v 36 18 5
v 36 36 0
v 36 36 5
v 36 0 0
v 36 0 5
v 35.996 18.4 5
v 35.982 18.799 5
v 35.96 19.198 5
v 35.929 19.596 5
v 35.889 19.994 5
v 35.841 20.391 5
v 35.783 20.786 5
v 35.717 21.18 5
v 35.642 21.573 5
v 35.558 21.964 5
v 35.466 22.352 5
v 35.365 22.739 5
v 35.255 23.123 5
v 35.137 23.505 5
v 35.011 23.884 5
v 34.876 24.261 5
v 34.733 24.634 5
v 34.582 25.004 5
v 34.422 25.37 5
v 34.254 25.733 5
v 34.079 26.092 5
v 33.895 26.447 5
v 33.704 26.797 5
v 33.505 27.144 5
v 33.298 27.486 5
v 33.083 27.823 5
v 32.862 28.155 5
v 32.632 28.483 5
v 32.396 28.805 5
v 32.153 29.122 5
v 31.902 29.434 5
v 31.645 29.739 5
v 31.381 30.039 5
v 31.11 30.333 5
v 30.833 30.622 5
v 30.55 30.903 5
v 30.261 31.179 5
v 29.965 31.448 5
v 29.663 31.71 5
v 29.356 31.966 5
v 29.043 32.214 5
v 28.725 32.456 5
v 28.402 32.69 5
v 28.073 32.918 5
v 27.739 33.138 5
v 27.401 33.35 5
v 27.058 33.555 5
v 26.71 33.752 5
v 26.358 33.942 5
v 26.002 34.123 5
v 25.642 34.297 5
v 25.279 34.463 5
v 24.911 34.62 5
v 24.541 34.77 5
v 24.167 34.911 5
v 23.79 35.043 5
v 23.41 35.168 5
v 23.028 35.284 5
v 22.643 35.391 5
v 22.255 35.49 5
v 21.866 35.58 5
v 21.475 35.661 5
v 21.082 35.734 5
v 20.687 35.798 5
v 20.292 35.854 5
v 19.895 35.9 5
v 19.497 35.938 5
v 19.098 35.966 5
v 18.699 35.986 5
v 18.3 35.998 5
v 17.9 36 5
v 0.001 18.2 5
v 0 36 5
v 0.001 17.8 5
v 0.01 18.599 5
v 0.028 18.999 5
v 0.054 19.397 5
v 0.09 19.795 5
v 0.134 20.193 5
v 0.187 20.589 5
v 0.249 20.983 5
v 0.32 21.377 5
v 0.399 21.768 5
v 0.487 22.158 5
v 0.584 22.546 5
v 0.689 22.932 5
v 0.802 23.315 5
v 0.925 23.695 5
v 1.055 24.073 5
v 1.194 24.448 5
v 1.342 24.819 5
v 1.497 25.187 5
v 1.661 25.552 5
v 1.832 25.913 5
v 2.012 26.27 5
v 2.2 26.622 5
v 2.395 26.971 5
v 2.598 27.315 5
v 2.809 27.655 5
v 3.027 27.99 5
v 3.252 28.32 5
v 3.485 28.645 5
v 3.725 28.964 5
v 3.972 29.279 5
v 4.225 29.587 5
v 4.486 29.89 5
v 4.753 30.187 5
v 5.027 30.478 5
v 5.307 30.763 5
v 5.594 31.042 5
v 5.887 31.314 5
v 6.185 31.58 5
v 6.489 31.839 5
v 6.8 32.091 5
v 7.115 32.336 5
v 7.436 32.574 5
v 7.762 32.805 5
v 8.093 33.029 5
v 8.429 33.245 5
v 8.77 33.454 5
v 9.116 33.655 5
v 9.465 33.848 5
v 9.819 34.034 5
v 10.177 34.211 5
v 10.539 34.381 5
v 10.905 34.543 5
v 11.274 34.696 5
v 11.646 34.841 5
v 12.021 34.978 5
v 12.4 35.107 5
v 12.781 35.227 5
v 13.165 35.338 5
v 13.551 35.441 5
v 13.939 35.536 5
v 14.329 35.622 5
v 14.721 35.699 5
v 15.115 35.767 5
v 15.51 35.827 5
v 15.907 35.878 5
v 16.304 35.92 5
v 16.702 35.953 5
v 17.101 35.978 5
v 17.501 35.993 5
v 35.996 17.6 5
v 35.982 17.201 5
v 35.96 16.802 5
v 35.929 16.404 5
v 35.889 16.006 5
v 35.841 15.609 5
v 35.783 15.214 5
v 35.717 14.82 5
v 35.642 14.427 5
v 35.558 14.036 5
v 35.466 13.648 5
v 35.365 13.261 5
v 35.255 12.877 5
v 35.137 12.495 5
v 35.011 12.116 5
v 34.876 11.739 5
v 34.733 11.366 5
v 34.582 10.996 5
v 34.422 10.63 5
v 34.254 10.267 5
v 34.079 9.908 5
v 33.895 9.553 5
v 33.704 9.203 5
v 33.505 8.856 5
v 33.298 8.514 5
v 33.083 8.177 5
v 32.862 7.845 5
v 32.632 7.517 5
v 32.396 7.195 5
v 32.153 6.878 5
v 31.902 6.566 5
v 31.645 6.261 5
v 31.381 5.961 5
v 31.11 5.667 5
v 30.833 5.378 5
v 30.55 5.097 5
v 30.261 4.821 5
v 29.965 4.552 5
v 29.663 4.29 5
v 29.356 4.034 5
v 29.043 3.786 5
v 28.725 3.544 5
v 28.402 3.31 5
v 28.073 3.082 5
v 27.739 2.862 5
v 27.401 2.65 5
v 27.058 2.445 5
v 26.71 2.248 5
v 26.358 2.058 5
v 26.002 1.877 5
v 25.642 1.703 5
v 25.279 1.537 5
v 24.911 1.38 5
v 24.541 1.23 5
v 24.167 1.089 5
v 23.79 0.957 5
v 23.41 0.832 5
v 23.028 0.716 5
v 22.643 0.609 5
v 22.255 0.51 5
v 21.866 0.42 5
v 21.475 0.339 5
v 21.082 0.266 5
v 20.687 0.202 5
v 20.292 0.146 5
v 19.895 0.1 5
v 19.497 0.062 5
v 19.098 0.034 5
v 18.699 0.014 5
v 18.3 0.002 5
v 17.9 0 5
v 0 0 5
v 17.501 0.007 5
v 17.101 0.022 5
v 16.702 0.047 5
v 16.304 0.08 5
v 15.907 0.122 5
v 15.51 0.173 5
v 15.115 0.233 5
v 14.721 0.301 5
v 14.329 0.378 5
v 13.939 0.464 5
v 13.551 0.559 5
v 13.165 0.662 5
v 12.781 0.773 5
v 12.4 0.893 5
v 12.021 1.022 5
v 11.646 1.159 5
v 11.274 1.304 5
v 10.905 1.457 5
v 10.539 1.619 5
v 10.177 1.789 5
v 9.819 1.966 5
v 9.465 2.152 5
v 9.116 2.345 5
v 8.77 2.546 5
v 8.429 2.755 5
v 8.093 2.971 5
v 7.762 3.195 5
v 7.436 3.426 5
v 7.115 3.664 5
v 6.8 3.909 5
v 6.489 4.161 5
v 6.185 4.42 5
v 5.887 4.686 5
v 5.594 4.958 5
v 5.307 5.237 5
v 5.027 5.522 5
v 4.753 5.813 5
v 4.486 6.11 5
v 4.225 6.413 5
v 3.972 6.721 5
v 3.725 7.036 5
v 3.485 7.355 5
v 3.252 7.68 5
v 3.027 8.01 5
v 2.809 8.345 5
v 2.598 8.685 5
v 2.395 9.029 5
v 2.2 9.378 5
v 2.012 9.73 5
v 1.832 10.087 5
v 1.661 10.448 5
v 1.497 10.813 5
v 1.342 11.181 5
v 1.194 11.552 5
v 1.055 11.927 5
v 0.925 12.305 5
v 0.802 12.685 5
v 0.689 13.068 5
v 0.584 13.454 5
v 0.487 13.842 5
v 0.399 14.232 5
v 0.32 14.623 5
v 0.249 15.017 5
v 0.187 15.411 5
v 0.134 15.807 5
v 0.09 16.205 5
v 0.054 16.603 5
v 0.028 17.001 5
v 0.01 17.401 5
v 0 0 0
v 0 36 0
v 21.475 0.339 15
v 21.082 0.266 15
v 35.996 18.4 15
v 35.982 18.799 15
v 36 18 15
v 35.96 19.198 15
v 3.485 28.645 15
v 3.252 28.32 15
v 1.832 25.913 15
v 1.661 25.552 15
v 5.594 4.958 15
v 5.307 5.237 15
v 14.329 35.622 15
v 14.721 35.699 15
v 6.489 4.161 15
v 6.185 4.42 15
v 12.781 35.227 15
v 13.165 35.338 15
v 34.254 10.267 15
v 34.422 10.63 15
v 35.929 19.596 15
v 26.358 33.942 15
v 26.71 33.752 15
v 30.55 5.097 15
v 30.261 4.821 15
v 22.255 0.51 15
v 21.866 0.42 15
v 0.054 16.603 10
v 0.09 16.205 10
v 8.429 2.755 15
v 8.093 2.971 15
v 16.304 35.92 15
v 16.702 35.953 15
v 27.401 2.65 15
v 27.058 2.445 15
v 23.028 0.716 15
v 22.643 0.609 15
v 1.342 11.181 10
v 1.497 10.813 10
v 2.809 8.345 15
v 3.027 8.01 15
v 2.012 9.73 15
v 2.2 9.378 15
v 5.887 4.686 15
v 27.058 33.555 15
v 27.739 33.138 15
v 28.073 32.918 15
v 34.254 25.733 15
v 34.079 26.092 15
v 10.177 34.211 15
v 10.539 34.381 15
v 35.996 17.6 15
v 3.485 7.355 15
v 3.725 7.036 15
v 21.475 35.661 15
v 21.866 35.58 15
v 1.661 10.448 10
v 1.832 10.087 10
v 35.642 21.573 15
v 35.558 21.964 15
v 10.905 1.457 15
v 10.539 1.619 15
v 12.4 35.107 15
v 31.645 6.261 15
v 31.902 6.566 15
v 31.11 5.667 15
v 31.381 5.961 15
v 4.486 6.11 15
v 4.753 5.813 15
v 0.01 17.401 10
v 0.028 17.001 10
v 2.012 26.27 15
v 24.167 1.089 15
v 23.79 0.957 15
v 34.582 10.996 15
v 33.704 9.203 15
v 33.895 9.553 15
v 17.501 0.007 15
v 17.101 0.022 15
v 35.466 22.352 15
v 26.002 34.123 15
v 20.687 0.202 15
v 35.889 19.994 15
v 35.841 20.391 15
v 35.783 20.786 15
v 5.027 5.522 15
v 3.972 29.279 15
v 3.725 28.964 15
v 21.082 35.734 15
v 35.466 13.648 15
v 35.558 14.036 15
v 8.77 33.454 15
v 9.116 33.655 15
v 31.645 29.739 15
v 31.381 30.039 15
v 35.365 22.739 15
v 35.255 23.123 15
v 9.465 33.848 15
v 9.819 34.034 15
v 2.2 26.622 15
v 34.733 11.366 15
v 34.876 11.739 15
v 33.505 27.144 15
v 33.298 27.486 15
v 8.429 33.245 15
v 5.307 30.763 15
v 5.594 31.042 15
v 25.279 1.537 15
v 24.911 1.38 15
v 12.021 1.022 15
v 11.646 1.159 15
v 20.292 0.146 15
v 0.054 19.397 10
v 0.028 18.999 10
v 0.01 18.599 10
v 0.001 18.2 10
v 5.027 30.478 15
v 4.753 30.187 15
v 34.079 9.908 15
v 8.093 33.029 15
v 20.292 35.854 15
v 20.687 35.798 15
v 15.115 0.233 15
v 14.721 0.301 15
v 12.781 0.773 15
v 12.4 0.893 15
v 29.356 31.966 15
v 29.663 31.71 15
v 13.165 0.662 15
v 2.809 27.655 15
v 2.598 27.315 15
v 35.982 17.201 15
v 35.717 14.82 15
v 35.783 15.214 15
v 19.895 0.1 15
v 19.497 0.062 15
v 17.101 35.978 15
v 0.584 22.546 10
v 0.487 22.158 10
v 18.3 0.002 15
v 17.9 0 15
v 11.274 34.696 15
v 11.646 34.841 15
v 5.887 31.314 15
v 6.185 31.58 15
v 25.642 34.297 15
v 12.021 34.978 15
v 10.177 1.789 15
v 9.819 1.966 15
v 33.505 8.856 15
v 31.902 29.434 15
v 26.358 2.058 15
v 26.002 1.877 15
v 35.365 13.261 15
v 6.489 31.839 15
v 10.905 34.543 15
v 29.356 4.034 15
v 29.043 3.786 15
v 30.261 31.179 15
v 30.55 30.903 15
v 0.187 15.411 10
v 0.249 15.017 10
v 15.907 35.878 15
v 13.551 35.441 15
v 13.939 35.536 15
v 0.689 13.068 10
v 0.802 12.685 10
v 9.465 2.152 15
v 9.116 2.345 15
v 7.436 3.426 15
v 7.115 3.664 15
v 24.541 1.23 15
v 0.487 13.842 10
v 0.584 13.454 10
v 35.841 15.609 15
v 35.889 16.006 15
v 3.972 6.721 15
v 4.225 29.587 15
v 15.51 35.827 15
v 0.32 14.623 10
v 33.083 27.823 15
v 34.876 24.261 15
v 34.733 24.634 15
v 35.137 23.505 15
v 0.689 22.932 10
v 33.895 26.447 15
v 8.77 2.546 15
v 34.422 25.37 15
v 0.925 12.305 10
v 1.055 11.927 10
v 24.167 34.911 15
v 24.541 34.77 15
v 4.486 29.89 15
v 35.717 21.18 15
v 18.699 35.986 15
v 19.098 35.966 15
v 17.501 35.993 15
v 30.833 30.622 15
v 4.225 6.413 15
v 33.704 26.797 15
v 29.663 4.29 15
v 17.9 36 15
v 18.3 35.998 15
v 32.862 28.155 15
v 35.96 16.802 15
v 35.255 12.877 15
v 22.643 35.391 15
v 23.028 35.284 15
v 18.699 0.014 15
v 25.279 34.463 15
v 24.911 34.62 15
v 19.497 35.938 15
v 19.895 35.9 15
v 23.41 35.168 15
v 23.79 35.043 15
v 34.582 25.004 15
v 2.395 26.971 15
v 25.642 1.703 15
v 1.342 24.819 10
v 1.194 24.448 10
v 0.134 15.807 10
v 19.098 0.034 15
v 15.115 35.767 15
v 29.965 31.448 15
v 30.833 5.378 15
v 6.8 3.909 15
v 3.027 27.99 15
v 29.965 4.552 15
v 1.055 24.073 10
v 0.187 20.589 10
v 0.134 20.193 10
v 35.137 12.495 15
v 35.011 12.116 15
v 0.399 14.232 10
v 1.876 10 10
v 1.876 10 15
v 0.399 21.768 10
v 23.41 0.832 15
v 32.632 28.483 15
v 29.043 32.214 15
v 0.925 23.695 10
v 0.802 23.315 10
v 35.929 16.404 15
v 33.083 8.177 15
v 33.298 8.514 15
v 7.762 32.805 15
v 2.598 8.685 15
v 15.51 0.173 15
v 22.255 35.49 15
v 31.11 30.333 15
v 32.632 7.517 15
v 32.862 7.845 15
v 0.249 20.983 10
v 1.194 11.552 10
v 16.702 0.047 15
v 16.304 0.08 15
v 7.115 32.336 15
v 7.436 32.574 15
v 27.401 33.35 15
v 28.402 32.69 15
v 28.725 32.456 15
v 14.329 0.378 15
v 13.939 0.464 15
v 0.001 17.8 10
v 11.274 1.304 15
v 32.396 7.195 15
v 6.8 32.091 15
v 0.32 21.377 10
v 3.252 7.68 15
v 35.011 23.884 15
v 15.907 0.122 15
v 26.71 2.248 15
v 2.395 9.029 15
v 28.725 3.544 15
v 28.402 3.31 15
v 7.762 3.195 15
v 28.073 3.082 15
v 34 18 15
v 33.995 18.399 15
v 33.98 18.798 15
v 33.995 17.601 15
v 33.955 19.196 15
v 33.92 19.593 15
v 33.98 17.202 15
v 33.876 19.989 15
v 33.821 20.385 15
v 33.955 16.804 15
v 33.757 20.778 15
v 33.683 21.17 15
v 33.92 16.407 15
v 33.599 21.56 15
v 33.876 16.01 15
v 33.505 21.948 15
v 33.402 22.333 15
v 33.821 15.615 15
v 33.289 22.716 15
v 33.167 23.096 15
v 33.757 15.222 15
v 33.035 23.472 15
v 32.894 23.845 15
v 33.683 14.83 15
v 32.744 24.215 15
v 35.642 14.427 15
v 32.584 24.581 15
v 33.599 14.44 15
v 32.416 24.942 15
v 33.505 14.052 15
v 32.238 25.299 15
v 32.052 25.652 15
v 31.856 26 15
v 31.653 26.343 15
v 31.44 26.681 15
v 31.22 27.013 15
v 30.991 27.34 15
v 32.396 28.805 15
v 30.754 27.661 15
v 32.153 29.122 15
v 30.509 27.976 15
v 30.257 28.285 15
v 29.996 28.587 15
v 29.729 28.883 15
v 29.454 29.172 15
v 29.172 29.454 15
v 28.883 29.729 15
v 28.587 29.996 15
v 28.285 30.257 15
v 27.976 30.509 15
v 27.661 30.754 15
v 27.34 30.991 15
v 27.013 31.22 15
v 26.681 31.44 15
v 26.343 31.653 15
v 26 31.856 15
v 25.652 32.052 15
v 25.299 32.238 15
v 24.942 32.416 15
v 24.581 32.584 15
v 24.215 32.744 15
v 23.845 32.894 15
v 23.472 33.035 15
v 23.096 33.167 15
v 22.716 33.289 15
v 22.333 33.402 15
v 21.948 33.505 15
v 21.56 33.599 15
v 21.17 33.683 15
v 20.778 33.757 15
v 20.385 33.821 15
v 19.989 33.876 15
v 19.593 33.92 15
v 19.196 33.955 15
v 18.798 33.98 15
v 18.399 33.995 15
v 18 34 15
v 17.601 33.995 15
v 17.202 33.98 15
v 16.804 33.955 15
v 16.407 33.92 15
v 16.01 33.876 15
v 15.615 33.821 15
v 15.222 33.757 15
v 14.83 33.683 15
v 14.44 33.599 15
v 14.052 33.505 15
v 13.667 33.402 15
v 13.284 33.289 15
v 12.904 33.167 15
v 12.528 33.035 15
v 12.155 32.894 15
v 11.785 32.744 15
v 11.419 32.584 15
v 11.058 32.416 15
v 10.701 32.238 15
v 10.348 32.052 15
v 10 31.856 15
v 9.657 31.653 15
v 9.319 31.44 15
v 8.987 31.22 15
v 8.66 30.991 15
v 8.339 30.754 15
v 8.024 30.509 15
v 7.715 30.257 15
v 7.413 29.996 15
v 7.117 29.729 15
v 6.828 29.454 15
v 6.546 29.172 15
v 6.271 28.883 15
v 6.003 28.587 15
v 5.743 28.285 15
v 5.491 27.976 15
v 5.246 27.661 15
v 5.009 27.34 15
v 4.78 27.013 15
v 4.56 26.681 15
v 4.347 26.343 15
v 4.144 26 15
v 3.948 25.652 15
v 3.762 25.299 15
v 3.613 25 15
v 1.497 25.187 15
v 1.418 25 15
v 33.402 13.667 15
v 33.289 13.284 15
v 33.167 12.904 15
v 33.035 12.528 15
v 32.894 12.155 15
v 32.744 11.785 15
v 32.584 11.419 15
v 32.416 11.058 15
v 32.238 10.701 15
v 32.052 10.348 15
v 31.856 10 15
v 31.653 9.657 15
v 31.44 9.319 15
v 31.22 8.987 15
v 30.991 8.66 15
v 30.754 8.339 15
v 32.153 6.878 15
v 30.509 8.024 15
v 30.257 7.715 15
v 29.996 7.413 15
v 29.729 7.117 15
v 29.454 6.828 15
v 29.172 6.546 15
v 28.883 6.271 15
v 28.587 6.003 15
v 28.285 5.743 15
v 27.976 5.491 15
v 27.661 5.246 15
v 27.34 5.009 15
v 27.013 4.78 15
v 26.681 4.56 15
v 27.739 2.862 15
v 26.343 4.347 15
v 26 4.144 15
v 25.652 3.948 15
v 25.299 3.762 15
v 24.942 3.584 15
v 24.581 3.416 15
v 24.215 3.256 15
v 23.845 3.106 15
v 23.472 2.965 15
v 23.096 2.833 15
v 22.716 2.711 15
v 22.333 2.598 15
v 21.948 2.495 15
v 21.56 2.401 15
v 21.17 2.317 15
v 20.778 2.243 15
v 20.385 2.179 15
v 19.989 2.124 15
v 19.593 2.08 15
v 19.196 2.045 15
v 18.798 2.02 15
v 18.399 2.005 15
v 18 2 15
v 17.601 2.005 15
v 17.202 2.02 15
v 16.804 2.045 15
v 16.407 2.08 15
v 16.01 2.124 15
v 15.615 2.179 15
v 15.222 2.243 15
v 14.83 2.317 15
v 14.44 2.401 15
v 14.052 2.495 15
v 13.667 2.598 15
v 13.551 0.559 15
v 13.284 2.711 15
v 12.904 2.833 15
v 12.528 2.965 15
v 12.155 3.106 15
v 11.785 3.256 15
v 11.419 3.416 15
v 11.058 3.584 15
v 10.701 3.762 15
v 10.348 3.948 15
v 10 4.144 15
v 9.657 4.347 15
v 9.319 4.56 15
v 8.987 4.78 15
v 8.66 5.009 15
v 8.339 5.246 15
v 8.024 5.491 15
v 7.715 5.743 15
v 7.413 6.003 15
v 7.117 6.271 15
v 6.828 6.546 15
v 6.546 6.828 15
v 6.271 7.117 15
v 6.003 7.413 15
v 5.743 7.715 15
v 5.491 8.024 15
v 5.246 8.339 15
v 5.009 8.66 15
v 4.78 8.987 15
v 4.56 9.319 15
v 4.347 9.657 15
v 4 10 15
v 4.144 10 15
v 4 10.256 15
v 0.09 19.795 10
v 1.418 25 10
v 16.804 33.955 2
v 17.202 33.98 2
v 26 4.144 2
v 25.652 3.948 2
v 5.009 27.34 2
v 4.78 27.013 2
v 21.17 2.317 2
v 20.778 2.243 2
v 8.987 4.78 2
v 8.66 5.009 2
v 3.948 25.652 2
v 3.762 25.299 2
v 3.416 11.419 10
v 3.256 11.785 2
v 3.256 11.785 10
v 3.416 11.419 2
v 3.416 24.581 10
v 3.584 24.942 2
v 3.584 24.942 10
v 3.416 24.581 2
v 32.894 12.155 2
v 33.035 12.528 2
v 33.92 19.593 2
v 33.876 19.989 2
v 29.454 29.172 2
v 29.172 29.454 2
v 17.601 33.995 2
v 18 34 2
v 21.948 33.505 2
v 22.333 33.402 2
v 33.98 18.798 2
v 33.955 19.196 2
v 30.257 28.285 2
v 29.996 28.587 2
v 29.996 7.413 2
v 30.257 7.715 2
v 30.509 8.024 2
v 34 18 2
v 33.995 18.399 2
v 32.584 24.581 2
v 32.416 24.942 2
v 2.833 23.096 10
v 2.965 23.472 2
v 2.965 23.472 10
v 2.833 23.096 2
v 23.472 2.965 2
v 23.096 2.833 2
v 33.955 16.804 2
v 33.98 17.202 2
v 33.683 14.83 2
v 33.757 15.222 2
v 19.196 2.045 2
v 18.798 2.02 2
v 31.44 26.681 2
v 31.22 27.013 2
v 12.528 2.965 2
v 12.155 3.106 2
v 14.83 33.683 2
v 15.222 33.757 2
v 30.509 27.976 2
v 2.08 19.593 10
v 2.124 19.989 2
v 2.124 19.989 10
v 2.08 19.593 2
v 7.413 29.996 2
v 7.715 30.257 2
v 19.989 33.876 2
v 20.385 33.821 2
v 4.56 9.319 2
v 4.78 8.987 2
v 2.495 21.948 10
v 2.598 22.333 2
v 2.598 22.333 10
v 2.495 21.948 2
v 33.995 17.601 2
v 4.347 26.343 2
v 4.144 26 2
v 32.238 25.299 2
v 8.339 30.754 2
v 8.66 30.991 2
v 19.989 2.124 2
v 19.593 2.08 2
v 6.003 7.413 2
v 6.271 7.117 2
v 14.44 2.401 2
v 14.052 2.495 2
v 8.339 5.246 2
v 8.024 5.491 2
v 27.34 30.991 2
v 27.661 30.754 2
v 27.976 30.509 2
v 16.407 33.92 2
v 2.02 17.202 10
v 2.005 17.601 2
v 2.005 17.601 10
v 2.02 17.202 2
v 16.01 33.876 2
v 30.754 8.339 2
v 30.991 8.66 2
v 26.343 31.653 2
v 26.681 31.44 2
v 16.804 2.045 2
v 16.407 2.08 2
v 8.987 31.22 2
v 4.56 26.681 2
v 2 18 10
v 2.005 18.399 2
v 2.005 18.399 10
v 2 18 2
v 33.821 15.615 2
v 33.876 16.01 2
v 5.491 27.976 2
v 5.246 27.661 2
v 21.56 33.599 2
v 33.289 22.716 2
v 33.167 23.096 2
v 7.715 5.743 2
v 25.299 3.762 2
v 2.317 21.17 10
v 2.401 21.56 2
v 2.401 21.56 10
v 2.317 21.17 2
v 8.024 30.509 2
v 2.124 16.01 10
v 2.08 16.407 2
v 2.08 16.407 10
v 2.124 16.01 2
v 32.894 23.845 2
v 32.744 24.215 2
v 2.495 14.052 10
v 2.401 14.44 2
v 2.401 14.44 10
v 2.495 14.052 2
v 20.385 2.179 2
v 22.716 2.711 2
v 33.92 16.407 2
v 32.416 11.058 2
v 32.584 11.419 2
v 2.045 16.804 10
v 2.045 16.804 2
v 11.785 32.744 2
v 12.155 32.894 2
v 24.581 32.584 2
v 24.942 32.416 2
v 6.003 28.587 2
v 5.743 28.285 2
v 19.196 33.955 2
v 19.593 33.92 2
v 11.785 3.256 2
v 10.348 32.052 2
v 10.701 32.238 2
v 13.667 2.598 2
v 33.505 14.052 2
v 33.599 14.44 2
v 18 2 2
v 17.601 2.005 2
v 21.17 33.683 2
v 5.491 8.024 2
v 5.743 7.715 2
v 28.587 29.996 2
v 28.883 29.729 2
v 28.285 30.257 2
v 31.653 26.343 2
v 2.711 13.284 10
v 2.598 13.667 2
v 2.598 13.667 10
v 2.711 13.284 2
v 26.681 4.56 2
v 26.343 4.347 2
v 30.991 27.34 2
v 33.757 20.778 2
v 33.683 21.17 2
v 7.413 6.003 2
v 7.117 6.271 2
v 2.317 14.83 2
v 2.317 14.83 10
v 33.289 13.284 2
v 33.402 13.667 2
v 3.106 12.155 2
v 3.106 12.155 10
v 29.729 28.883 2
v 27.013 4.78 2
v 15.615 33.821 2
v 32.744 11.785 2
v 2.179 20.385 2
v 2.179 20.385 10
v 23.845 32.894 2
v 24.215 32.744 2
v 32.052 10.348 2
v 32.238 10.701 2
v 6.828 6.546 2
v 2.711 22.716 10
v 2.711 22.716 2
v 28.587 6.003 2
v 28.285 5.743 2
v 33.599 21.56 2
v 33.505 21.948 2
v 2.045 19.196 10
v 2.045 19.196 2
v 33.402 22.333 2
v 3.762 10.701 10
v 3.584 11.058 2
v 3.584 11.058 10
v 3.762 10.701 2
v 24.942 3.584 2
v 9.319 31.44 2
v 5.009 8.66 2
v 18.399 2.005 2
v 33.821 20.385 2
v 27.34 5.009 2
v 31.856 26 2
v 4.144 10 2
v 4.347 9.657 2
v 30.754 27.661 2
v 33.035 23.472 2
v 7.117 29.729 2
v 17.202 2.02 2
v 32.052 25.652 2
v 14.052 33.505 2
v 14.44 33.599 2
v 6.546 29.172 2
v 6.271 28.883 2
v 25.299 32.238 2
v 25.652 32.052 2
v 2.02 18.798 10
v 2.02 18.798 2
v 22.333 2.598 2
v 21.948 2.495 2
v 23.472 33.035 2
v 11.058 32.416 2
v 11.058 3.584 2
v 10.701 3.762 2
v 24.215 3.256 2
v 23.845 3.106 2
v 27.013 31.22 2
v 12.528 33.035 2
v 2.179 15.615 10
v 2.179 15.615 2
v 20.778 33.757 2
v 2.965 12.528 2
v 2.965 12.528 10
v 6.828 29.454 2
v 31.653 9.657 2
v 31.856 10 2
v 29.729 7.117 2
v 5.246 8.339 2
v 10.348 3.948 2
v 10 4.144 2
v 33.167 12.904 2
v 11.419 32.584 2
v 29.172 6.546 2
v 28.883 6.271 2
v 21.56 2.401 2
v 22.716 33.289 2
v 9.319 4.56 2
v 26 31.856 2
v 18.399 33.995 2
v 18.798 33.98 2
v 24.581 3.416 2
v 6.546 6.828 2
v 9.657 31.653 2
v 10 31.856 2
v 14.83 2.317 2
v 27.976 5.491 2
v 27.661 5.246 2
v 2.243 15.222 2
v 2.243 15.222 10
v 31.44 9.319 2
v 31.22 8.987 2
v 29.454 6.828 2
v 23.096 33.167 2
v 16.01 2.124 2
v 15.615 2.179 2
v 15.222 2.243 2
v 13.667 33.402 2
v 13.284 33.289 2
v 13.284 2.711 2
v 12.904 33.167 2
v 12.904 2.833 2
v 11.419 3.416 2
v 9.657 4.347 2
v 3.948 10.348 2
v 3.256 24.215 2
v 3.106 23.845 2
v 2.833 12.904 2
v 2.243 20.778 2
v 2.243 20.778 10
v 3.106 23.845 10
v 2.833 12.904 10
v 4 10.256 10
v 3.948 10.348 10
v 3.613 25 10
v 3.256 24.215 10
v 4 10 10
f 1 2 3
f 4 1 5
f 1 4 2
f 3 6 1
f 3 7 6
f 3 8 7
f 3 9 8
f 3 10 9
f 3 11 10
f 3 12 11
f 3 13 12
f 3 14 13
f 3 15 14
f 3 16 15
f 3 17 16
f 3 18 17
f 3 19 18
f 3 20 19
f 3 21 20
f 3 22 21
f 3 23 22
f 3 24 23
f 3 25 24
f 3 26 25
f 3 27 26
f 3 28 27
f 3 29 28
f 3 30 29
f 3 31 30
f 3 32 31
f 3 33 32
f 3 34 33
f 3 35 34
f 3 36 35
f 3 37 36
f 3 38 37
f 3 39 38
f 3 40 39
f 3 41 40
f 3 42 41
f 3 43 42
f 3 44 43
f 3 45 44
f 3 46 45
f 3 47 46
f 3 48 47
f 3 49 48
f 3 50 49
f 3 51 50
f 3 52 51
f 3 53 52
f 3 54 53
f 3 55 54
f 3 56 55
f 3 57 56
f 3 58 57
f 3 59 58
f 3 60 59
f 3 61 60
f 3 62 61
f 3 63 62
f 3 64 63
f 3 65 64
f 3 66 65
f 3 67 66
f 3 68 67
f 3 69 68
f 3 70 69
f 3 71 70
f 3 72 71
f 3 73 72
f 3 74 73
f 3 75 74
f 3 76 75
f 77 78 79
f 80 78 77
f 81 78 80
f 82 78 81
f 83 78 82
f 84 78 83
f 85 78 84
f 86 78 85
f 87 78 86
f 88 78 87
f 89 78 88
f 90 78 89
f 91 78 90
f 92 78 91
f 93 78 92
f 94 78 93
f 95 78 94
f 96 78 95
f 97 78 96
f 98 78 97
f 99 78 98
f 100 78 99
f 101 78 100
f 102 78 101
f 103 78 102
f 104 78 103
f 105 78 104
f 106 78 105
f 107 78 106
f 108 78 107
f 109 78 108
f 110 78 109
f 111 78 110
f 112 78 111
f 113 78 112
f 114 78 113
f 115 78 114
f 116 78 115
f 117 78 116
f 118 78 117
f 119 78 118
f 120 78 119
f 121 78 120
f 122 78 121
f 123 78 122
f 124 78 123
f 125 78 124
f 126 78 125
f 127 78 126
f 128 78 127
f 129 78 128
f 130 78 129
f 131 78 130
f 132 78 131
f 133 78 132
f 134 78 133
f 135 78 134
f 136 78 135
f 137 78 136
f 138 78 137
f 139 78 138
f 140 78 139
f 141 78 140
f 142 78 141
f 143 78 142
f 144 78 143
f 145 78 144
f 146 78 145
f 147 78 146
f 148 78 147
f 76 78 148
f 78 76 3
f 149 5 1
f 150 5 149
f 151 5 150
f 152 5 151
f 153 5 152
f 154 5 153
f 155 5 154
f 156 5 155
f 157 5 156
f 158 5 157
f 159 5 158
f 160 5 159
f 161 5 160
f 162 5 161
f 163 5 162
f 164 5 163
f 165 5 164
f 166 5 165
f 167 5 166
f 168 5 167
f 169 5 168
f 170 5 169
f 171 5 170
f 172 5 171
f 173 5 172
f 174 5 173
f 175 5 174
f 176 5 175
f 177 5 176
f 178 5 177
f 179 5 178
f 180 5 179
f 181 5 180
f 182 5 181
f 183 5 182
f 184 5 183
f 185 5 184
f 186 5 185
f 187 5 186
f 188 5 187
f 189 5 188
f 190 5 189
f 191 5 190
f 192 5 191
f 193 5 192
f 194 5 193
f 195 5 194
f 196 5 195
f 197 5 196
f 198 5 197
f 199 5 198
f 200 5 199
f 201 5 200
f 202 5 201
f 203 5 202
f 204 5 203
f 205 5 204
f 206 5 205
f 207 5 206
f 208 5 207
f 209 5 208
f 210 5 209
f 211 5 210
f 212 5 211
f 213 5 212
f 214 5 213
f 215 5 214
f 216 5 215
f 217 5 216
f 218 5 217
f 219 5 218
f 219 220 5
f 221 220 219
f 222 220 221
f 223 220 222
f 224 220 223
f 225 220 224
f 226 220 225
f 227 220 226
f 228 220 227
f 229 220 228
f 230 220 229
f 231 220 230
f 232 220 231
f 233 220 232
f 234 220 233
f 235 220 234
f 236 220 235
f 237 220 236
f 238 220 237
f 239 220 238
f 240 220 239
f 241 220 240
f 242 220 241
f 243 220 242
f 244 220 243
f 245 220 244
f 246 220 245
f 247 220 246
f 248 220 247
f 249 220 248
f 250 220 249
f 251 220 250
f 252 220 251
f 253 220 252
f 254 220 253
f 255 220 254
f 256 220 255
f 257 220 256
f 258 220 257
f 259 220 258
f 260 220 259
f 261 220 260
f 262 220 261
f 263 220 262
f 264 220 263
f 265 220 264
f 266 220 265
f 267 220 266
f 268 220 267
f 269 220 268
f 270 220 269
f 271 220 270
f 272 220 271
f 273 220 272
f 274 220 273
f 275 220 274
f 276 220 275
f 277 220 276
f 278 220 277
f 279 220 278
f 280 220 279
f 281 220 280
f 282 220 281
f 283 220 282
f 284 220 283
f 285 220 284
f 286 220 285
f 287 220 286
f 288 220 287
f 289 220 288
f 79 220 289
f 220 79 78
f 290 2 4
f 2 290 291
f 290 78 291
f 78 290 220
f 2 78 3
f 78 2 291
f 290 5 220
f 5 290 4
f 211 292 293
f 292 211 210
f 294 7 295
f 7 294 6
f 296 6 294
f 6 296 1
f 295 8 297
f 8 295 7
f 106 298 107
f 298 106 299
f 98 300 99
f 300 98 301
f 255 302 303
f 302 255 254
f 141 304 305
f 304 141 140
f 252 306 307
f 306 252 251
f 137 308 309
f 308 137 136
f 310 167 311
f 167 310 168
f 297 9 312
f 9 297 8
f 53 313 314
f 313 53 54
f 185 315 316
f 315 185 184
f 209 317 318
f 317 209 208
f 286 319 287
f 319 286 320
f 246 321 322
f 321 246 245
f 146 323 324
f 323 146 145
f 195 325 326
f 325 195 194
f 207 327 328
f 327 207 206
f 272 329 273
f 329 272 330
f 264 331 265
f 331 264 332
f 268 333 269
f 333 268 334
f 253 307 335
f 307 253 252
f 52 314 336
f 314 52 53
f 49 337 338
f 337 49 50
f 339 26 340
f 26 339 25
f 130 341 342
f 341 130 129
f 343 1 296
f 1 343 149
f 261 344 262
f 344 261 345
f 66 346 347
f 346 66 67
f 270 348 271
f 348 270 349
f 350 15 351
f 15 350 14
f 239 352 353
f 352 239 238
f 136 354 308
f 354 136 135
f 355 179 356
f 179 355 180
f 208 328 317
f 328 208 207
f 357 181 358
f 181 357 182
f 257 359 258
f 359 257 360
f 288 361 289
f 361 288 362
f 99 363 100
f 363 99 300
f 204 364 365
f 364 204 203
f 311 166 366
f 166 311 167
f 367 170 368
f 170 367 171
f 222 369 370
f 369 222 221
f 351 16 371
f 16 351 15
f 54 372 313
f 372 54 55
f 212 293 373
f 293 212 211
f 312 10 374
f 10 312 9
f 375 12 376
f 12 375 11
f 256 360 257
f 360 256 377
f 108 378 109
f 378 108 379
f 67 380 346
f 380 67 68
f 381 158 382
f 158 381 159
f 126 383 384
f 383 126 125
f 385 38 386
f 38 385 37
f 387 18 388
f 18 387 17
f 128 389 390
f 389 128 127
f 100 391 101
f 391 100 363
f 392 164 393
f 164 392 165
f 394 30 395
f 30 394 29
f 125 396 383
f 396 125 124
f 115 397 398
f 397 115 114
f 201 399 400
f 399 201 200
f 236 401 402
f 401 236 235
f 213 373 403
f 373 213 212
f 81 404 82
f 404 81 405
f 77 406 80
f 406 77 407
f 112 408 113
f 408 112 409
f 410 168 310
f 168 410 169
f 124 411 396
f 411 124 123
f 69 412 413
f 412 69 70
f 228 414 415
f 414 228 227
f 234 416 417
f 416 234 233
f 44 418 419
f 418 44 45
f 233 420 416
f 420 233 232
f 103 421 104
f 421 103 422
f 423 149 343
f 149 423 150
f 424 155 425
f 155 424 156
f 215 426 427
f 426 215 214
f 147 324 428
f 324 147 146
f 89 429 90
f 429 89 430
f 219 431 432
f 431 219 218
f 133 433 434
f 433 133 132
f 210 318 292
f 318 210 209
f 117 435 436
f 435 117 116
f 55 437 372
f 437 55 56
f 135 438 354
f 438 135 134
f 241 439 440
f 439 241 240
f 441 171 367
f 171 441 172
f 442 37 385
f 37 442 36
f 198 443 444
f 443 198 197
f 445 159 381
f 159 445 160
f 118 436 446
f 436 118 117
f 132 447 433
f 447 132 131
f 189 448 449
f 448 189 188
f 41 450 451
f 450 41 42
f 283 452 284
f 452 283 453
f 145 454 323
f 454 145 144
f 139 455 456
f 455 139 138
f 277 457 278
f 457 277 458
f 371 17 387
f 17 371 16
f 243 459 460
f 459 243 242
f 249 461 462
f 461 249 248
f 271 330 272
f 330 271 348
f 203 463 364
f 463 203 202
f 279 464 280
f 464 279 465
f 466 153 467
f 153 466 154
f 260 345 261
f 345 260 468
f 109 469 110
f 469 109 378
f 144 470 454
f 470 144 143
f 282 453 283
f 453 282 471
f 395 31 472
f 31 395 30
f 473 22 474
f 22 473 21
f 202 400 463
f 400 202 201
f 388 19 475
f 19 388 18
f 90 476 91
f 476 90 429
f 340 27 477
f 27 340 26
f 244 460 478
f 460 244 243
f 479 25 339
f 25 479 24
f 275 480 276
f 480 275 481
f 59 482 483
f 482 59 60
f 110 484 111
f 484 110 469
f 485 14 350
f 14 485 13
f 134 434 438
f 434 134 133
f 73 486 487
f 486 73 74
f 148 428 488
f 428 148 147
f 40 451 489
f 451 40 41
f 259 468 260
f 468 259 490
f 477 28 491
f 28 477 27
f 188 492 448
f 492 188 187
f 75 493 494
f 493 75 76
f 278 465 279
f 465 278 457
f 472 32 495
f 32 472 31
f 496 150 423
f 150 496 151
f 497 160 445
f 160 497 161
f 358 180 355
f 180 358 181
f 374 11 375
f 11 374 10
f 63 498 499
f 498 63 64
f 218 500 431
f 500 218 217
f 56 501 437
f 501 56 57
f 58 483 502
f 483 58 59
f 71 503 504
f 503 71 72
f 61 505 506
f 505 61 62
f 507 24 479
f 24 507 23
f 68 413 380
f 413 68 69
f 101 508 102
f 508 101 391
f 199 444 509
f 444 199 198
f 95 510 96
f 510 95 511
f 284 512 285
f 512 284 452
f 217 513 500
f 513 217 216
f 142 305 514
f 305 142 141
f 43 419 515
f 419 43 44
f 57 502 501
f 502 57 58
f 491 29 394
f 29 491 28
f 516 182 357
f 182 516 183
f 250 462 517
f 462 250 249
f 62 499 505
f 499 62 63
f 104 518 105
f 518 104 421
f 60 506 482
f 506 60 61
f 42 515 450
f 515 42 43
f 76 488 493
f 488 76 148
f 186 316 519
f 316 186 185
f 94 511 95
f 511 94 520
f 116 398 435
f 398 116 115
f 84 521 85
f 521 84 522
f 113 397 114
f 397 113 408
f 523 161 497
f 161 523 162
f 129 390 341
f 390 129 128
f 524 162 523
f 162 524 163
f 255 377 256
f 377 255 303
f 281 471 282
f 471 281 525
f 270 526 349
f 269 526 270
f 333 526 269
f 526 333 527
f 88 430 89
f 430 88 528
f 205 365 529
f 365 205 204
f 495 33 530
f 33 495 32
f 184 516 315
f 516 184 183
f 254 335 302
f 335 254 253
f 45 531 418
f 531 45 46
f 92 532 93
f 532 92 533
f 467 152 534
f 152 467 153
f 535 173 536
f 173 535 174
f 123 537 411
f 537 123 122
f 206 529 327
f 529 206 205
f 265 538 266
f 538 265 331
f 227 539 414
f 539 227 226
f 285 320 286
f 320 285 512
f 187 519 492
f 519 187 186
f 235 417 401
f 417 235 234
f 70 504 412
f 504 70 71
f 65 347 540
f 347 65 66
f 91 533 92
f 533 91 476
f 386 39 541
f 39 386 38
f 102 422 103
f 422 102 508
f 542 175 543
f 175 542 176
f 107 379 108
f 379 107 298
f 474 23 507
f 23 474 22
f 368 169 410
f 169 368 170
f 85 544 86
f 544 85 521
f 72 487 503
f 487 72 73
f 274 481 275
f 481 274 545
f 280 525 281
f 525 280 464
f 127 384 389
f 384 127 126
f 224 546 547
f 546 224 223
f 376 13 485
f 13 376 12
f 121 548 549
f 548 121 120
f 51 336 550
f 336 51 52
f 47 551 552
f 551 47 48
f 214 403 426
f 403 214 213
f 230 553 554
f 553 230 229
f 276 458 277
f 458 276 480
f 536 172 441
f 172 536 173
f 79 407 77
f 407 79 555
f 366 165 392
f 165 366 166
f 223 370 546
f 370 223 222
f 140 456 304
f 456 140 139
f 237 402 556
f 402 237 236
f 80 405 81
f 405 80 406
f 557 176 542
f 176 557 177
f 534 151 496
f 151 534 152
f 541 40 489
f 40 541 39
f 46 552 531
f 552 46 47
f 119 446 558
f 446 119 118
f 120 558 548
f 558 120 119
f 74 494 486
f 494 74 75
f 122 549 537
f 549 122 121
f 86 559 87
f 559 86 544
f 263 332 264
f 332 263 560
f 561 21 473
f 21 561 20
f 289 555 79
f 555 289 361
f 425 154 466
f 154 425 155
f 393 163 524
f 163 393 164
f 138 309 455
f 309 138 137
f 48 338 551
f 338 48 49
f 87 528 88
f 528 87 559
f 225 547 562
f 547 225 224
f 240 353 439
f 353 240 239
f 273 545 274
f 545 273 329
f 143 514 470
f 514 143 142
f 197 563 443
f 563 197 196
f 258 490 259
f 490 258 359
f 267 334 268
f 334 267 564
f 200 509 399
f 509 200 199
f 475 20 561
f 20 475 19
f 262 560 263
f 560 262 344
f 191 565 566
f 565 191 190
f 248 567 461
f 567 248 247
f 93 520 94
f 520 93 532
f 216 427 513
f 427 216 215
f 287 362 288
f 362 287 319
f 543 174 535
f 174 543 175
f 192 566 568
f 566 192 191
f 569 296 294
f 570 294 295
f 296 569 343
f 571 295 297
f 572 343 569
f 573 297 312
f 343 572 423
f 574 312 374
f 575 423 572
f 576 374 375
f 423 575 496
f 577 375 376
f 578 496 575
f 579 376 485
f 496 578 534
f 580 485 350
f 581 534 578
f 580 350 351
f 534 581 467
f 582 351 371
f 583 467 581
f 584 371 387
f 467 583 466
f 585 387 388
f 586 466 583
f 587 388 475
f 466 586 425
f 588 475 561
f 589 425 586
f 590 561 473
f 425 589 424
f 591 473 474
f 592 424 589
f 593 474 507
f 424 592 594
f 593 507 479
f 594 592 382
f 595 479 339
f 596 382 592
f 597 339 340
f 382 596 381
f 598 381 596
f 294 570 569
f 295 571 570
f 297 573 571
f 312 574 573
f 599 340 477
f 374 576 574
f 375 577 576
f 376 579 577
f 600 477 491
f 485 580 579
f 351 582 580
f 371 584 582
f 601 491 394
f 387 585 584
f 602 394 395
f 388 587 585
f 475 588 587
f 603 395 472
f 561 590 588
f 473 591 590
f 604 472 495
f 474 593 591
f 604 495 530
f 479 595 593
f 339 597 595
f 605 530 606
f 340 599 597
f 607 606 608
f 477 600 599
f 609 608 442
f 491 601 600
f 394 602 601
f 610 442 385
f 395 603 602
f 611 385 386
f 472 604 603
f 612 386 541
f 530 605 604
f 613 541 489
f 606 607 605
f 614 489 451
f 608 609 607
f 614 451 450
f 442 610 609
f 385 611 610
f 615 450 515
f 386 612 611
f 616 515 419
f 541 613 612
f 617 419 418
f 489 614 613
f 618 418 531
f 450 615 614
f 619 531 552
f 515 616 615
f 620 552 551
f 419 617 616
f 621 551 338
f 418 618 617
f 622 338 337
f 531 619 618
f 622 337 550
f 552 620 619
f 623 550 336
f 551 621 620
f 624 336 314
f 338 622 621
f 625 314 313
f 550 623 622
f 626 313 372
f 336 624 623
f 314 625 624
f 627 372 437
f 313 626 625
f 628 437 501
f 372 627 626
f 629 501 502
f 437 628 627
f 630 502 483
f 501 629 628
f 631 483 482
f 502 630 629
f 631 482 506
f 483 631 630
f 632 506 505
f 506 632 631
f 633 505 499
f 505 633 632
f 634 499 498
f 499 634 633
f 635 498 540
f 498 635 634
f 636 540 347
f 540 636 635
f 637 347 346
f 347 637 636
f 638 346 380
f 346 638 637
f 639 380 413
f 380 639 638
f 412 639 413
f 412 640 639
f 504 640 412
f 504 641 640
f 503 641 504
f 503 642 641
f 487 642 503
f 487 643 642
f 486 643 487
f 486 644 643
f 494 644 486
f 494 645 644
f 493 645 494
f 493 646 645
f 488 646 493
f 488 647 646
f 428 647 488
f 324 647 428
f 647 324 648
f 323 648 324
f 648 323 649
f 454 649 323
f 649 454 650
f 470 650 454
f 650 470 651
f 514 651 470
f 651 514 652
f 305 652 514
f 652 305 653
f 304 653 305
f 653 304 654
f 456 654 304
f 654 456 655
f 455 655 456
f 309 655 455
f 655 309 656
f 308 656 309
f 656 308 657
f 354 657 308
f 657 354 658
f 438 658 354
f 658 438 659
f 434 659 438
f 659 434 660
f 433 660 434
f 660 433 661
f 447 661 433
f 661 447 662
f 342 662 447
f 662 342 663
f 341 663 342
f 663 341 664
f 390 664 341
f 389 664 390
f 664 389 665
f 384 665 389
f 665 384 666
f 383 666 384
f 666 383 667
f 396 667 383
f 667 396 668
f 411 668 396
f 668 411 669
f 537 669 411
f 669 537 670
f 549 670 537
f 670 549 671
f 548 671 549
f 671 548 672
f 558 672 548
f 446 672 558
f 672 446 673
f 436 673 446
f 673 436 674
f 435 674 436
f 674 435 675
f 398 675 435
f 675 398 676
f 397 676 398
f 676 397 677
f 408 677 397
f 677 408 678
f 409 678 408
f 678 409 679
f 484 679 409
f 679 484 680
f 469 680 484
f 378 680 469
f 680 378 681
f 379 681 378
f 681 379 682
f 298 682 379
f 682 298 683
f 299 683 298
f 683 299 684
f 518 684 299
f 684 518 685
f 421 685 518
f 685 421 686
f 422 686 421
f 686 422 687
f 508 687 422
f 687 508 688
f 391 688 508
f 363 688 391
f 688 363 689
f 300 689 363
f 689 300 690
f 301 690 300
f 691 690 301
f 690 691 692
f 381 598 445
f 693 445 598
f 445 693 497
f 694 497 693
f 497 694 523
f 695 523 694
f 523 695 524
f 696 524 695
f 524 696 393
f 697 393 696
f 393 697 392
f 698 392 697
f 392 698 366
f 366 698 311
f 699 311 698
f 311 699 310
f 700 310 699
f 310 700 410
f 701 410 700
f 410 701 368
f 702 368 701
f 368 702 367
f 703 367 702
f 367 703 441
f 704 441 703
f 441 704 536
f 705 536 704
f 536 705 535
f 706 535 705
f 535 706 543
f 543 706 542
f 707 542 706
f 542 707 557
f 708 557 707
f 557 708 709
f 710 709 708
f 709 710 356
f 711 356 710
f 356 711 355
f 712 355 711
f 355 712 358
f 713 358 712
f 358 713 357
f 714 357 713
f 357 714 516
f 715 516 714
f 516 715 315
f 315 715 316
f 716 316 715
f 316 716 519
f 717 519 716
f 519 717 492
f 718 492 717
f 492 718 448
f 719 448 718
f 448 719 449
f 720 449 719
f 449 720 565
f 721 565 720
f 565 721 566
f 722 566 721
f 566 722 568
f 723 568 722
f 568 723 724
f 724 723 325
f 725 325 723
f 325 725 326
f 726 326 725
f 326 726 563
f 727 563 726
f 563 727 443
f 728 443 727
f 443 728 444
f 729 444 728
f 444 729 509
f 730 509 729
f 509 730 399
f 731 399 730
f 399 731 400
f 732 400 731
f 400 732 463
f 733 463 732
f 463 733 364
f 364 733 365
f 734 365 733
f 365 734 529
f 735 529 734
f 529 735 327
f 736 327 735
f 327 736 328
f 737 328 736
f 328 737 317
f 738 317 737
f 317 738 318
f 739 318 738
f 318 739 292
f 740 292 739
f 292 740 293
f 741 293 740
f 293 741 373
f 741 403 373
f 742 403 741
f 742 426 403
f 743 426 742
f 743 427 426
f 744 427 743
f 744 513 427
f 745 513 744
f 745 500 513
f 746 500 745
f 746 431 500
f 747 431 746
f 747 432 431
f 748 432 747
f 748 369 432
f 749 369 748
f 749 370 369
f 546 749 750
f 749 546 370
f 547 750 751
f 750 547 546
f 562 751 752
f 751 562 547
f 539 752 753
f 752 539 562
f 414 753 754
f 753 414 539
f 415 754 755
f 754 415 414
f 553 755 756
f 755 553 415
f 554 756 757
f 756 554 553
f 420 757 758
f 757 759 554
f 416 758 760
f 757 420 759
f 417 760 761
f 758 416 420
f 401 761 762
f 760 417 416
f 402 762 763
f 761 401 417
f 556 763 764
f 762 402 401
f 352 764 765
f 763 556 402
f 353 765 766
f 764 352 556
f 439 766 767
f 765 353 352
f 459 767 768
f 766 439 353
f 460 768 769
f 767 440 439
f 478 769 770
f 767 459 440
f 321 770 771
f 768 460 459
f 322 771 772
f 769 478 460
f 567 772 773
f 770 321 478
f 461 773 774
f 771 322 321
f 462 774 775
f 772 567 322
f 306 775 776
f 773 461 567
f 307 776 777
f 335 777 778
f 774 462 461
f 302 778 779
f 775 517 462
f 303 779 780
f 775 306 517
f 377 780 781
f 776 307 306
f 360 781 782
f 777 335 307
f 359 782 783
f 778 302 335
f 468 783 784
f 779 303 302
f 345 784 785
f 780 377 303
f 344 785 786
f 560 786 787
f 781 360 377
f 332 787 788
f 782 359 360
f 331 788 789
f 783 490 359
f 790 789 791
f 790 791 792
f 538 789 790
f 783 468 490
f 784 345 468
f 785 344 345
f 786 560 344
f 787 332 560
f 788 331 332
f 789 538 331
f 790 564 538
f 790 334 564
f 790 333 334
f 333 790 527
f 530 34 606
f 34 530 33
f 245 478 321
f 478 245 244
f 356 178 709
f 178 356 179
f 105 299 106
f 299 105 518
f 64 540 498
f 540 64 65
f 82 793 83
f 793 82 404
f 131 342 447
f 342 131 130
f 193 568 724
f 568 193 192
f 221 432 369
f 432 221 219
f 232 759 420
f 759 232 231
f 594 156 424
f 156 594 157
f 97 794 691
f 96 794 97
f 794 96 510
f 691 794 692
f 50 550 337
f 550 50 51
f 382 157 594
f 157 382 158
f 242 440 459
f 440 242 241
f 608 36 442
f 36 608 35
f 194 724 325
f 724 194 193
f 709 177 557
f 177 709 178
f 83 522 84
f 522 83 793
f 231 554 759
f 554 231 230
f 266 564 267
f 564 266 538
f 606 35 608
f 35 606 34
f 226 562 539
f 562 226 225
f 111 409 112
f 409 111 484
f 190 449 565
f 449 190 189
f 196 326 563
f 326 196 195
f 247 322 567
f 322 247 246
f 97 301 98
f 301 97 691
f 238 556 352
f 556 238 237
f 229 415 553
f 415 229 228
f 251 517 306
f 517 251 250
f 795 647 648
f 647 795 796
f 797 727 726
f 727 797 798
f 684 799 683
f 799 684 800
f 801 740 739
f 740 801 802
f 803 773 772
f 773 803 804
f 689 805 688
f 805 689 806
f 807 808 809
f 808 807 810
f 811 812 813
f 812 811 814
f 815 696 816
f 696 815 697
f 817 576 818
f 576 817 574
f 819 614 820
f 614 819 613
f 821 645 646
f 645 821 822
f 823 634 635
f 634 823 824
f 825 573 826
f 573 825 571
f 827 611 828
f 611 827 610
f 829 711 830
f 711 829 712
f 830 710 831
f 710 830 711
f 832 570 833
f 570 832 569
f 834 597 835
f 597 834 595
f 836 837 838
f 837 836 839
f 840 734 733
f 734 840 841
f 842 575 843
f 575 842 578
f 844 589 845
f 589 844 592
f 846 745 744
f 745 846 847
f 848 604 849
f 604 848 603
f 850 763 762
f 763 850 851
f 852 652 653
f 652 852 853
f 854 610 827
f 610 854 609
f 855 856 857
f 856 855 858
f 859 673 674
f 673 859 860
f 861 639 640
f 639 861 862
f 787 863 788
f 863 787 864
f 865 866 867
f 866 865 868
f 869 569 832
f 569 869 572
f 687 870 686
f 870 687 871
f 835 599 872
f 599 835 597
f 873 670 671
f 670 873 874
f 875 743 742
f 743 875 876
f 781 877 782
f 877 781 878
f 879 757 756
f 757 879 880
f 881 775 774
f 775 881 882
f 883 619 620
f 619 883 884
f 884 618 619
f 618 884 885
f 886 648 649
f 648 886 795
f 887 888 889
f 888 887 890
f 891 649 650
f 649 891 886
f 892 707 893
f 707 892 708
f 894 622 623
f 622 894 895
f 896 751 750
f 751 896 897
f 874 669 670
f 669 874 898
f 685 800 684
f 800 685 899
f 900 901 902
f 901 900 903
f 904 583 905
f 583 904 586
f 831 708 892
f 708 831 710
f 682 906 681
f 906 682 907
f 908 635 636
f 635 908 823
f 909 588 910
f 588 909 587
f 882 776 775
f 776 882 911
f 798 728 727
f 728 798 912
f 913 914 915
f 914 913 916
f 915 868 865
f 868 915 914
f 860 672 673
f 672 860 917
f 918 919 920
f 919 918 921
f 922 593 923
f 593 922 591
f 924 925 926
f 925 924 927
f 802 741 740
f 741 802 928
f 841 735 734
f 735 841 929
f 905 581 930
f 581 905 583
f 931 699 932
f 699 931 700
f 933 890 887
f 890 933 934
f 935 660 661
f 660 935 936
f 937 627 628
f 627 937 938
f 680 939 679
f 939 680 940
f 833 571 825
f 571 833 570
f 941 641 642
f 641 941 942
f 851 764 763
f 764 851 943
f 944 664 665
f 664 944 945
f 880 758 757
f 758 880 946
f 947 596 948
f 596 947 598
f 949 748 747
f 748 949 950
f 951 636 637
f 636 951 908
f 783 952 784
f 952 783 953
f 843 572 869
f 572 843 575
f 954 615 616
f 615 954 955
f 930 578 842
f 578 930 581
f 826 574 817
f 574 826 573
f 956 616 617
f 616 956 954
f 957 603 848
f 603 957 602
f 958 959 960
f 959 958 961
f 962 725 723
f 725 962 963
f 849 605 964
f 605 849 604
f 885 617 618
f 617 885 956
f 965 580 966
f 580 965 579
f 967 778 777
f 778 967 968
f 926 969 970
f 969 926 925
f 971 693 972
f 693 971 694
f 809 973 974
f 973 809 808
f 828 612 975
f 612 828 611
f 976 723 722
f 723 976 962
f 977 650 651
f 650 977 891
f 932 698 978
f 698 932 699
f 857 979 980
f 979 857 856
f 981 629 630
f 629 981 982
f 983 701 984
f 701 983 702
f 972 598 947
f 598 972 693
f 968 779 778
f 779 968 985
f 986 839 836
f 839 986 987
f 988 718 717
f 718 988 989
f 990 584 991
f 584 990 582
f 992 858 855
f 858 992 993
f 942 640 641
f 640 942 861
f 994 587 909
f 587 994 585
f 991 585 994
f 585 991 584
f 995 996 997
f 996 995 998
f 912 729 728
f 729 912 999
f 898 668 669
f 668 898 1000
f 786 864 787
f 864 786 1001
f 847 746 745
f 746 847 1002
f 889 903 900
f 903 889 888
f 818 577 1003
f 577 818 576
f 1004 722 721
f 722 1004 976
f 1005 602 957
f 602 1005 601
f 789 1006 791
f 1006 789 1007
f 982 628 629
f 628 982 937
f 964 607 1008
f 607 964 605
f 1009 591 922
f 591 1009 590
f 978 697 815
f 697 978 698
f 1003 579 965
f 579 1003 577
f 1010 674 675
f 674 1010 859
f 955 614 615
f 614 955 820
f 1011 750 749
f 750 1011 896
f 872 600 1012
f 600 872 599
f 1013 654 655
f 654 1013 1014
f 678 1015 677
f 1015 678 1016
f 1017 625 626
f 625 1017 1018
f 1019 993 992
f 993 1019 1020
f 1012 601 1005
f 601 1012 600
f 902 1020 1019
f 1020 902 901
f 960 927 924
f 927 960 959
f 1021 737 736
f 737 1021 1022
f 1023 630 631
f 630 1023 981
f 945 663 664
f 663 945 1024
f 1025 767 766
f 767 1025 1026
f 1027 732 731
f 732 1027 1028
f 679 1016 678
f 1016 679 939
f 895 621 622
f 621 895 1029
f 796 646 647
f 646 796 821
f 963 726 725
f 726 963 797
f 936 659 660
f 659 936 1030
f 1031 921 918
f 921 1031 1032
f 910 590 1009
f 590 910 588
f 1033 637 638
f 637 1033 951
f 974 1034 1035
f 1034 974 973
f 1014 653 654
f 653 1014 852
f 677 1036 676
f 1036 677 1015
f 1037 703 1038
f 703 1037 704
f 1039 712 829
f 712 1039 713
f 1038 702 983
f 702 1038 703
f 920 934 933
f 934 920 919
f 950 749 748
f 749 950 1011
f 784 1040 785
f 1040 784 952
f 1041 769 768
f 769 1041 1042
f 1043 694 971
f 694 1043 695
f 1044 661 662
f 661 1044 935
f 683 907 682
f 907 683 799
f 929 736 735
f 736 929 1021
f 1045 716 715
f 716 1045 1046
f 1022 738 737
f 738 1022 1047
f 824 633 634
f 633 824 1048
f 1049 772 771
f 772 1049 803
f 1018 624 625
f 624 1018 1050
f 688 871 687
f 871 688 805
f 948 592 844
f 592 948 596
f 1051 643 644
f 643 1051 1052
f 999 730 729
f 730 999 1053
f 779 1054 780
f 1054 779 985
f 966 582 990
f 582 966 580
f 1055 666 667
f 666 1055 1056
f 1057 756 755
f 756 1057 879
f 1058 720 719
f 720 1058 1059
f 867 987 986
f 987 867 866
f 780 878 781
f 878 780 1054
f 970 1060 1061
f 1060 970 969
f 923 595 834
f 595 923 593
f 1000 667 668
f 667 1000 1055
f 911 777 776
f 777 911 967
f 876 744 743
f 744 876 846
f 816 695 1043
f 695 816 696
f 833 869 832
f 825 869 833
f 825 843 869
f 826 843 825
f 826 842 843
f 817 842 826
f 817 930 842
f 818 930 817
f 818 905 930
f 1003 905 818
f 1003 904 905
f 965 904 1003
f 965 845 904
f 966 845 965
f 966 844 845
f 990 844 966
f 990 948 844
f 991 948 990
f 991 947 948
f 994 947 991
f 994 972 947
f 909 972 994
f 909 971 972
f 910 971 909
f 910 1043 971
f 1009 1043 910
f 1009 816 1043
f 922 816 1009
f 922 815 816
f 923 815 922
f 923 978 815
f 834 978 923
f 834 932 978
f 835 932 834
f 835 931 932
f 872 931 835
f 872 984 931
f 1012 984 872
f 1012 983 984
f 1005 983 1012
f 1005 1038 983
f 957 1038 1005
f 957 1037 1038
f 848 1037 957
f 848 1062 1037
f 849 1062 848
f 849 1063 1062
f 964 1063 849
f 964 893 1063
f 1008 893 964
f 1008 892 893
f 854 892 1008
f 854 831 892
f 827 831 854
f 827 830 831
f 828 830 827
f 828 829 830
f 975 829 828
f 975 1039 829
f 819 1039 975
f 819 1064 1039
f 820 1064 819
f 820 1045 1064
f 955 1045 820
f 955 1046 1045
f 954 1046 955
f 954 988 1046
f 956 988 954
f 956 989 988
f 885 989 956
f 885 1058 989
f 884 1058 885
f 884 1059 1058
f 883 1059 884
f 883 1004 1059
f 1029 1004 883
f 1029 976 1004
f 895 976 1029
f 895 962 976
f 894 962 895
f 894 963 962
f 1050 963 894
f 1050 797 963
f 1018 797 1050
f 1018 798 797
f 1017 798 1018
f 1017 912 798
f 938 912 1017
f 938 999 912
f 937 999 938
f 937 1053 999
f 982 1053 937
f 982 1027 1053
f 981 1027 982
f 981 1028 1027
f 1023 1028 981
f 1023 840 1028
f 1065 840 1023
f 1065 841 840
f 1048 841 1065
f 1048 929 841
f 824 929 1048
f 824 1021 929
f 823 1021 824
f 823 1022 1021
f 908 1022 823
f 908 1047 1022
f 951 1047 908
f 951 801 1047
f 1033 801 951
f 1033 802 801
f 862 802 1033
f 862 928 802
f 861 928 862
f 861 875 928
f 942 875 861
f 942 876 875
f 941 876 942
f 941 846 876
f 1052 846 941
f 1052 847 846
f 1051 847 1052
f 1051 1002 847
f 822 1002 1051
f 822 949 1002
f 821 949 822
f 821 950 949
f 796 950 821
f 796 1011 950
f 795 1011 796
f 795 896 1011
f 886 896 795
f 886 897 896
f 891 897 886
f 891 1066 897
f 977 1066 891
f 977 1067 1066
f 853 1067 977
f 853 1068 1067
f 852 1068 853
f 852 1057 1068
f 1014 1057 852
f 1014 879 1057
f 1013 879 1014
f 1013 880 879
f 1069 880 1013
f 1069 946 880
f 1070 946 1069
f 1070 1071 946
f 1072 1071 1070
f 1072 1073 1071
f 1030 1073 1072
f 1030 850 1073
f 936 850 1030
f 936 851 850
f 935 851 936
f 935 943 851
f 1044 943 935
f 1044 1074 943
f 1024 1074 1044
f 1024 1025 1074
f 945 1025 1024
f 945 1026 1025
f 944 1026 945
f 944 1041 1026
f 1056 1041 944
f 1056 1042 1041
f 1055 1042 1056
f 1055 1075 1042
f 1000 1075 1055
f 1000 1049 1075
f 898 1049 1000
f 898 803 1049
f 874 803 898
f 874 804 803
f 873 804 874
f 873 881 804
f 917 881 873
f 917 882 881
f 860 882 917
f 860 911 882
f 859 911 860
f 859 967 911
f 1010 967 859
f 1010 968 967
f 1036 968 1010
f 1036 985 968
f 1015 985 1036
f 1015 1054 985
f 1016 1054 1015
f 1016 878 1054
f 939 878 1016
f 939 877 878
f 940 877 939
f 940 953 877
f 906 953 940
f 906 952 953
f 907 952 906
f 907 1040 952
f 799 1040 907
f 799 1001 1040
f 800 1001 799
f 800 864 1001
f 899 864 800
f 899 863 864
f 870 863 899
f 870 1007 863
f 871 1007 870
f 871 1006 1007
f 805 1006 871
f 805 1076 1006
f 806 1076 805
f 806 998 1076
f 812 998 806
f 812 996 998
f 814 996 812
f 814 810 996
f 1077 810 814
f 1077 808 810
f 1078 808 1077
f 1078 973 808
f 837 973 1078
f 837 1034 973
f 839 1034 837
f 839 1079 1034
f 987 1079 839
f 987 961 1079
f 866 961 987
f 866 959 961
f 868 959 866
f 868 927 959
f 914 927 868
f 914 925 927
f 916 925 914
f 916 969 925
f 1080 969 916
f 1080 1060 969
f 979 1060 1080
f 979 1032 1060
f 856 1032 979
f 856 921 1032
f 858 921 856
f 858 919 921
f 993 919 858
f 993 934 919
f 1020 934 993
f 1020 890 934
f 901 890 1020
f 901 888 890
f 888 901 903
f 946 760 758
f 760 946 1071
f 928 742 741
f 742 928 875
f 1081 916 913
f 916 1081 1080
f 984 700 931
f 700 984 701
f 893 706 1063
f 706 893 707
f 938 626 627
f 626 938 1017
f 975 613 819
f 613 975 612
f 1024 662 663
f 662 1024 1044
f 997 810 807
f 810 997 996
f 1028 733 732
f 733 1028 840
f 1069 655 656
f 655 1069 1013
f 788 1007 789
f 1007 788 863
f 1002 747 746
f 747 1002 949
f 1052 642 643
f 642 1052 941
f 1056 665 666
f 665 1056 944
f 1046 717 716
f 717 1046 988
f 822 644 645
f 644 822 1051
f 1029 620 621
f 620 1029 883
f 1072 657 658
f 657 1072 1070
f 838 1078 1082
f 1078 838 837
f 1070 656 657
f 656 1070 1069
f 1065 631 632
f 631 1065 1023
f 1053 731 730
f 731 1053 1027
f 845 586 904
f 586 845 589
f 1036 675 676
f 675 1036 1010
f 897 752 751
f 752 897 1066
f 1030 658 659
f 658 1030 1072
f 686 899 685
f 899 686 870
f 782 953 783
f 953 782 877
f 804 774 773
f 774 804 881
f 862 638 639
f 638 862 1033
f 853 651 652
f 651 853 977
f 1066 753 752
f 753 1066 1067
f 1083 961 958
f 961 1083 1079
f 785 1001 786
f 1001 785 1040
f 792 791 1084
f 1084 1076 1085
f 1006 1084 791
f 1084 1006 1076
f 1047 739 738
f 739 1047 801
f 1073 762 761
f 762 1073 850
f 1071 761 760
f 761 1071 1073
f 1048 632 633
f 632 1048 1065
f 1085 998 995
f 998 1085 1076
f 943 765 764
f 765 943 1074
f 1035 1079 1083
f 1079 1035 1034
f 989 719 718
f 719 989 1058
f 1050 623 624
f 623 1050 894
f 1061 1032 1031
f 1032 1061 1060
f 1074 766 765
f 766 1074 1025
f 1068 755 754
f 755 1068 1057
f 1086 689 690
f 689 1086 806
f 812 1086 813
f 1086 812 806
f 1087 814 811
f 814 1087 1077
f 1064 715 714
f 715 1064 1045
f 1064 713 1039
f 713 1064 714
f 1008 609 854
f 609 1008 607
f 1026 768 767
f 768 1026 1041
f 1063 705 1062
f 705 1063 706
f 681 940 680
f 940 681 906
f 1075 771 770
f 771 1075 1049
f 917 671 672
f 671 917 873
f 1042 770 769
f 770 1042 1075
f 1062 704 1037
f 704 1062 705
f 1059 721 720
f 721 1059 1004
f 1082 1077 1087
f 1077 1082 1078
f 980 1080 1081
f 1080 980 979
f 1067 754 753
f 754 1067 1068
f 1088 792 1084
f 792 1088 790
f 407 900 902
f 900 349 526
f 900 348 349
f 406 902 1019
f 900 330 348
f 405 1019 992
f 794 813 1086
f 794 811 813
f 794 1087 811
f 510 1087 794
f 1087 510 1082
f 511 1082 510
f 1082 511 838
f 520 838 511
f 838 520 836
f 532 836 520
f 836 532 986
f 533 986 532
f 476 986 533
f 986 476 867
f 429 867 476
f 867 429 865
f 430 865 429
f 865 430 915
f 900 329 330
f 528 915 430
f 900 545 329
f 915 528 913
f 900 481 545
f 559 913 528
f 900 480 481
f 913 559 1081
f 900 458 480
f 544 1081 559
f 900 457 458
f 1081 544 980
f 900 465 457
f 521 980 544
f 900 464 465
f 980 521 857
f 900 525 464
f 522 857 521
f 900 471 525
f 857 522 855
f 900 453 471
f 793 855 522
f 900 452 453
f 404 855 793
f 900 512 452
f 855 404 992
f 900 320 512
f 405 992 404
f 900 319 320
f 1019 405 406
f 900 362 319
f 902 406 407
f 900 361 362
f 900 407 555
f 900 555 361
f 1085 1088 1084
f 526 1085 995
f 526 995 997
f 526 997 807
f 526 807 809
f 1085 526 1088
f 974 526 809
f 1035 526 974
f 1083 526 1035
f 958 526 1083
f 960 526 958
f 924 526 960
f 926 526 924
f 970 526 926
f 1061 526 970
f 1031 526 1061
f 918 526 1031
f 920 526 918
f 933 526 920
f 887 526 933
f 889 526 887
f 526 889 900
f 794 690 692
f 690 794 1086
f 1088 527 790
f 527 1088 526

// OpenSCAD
// The Toothbrush and toothpaste holder thingy
$fa = 1;
$fs = 0.4;

// The Sum of All of the (non-negative) Components
module positive() {
    // Baseplate
    cube([36,36,5]);
    // Up part for charger
    color("blue")
    translate([0,0,0])
    // Up part for toothbrush one
    color("green")
    translate([18,18,0])
    cylinder(r=18,h=15);
}

difference() {
    // Charger cutout
    positive();
    // Toothbrush one cutout
    translate([18,18,2])
    cylinder(r=16,h=20);
    translate([0,10,10])
    cube([4,15,10]);
}
